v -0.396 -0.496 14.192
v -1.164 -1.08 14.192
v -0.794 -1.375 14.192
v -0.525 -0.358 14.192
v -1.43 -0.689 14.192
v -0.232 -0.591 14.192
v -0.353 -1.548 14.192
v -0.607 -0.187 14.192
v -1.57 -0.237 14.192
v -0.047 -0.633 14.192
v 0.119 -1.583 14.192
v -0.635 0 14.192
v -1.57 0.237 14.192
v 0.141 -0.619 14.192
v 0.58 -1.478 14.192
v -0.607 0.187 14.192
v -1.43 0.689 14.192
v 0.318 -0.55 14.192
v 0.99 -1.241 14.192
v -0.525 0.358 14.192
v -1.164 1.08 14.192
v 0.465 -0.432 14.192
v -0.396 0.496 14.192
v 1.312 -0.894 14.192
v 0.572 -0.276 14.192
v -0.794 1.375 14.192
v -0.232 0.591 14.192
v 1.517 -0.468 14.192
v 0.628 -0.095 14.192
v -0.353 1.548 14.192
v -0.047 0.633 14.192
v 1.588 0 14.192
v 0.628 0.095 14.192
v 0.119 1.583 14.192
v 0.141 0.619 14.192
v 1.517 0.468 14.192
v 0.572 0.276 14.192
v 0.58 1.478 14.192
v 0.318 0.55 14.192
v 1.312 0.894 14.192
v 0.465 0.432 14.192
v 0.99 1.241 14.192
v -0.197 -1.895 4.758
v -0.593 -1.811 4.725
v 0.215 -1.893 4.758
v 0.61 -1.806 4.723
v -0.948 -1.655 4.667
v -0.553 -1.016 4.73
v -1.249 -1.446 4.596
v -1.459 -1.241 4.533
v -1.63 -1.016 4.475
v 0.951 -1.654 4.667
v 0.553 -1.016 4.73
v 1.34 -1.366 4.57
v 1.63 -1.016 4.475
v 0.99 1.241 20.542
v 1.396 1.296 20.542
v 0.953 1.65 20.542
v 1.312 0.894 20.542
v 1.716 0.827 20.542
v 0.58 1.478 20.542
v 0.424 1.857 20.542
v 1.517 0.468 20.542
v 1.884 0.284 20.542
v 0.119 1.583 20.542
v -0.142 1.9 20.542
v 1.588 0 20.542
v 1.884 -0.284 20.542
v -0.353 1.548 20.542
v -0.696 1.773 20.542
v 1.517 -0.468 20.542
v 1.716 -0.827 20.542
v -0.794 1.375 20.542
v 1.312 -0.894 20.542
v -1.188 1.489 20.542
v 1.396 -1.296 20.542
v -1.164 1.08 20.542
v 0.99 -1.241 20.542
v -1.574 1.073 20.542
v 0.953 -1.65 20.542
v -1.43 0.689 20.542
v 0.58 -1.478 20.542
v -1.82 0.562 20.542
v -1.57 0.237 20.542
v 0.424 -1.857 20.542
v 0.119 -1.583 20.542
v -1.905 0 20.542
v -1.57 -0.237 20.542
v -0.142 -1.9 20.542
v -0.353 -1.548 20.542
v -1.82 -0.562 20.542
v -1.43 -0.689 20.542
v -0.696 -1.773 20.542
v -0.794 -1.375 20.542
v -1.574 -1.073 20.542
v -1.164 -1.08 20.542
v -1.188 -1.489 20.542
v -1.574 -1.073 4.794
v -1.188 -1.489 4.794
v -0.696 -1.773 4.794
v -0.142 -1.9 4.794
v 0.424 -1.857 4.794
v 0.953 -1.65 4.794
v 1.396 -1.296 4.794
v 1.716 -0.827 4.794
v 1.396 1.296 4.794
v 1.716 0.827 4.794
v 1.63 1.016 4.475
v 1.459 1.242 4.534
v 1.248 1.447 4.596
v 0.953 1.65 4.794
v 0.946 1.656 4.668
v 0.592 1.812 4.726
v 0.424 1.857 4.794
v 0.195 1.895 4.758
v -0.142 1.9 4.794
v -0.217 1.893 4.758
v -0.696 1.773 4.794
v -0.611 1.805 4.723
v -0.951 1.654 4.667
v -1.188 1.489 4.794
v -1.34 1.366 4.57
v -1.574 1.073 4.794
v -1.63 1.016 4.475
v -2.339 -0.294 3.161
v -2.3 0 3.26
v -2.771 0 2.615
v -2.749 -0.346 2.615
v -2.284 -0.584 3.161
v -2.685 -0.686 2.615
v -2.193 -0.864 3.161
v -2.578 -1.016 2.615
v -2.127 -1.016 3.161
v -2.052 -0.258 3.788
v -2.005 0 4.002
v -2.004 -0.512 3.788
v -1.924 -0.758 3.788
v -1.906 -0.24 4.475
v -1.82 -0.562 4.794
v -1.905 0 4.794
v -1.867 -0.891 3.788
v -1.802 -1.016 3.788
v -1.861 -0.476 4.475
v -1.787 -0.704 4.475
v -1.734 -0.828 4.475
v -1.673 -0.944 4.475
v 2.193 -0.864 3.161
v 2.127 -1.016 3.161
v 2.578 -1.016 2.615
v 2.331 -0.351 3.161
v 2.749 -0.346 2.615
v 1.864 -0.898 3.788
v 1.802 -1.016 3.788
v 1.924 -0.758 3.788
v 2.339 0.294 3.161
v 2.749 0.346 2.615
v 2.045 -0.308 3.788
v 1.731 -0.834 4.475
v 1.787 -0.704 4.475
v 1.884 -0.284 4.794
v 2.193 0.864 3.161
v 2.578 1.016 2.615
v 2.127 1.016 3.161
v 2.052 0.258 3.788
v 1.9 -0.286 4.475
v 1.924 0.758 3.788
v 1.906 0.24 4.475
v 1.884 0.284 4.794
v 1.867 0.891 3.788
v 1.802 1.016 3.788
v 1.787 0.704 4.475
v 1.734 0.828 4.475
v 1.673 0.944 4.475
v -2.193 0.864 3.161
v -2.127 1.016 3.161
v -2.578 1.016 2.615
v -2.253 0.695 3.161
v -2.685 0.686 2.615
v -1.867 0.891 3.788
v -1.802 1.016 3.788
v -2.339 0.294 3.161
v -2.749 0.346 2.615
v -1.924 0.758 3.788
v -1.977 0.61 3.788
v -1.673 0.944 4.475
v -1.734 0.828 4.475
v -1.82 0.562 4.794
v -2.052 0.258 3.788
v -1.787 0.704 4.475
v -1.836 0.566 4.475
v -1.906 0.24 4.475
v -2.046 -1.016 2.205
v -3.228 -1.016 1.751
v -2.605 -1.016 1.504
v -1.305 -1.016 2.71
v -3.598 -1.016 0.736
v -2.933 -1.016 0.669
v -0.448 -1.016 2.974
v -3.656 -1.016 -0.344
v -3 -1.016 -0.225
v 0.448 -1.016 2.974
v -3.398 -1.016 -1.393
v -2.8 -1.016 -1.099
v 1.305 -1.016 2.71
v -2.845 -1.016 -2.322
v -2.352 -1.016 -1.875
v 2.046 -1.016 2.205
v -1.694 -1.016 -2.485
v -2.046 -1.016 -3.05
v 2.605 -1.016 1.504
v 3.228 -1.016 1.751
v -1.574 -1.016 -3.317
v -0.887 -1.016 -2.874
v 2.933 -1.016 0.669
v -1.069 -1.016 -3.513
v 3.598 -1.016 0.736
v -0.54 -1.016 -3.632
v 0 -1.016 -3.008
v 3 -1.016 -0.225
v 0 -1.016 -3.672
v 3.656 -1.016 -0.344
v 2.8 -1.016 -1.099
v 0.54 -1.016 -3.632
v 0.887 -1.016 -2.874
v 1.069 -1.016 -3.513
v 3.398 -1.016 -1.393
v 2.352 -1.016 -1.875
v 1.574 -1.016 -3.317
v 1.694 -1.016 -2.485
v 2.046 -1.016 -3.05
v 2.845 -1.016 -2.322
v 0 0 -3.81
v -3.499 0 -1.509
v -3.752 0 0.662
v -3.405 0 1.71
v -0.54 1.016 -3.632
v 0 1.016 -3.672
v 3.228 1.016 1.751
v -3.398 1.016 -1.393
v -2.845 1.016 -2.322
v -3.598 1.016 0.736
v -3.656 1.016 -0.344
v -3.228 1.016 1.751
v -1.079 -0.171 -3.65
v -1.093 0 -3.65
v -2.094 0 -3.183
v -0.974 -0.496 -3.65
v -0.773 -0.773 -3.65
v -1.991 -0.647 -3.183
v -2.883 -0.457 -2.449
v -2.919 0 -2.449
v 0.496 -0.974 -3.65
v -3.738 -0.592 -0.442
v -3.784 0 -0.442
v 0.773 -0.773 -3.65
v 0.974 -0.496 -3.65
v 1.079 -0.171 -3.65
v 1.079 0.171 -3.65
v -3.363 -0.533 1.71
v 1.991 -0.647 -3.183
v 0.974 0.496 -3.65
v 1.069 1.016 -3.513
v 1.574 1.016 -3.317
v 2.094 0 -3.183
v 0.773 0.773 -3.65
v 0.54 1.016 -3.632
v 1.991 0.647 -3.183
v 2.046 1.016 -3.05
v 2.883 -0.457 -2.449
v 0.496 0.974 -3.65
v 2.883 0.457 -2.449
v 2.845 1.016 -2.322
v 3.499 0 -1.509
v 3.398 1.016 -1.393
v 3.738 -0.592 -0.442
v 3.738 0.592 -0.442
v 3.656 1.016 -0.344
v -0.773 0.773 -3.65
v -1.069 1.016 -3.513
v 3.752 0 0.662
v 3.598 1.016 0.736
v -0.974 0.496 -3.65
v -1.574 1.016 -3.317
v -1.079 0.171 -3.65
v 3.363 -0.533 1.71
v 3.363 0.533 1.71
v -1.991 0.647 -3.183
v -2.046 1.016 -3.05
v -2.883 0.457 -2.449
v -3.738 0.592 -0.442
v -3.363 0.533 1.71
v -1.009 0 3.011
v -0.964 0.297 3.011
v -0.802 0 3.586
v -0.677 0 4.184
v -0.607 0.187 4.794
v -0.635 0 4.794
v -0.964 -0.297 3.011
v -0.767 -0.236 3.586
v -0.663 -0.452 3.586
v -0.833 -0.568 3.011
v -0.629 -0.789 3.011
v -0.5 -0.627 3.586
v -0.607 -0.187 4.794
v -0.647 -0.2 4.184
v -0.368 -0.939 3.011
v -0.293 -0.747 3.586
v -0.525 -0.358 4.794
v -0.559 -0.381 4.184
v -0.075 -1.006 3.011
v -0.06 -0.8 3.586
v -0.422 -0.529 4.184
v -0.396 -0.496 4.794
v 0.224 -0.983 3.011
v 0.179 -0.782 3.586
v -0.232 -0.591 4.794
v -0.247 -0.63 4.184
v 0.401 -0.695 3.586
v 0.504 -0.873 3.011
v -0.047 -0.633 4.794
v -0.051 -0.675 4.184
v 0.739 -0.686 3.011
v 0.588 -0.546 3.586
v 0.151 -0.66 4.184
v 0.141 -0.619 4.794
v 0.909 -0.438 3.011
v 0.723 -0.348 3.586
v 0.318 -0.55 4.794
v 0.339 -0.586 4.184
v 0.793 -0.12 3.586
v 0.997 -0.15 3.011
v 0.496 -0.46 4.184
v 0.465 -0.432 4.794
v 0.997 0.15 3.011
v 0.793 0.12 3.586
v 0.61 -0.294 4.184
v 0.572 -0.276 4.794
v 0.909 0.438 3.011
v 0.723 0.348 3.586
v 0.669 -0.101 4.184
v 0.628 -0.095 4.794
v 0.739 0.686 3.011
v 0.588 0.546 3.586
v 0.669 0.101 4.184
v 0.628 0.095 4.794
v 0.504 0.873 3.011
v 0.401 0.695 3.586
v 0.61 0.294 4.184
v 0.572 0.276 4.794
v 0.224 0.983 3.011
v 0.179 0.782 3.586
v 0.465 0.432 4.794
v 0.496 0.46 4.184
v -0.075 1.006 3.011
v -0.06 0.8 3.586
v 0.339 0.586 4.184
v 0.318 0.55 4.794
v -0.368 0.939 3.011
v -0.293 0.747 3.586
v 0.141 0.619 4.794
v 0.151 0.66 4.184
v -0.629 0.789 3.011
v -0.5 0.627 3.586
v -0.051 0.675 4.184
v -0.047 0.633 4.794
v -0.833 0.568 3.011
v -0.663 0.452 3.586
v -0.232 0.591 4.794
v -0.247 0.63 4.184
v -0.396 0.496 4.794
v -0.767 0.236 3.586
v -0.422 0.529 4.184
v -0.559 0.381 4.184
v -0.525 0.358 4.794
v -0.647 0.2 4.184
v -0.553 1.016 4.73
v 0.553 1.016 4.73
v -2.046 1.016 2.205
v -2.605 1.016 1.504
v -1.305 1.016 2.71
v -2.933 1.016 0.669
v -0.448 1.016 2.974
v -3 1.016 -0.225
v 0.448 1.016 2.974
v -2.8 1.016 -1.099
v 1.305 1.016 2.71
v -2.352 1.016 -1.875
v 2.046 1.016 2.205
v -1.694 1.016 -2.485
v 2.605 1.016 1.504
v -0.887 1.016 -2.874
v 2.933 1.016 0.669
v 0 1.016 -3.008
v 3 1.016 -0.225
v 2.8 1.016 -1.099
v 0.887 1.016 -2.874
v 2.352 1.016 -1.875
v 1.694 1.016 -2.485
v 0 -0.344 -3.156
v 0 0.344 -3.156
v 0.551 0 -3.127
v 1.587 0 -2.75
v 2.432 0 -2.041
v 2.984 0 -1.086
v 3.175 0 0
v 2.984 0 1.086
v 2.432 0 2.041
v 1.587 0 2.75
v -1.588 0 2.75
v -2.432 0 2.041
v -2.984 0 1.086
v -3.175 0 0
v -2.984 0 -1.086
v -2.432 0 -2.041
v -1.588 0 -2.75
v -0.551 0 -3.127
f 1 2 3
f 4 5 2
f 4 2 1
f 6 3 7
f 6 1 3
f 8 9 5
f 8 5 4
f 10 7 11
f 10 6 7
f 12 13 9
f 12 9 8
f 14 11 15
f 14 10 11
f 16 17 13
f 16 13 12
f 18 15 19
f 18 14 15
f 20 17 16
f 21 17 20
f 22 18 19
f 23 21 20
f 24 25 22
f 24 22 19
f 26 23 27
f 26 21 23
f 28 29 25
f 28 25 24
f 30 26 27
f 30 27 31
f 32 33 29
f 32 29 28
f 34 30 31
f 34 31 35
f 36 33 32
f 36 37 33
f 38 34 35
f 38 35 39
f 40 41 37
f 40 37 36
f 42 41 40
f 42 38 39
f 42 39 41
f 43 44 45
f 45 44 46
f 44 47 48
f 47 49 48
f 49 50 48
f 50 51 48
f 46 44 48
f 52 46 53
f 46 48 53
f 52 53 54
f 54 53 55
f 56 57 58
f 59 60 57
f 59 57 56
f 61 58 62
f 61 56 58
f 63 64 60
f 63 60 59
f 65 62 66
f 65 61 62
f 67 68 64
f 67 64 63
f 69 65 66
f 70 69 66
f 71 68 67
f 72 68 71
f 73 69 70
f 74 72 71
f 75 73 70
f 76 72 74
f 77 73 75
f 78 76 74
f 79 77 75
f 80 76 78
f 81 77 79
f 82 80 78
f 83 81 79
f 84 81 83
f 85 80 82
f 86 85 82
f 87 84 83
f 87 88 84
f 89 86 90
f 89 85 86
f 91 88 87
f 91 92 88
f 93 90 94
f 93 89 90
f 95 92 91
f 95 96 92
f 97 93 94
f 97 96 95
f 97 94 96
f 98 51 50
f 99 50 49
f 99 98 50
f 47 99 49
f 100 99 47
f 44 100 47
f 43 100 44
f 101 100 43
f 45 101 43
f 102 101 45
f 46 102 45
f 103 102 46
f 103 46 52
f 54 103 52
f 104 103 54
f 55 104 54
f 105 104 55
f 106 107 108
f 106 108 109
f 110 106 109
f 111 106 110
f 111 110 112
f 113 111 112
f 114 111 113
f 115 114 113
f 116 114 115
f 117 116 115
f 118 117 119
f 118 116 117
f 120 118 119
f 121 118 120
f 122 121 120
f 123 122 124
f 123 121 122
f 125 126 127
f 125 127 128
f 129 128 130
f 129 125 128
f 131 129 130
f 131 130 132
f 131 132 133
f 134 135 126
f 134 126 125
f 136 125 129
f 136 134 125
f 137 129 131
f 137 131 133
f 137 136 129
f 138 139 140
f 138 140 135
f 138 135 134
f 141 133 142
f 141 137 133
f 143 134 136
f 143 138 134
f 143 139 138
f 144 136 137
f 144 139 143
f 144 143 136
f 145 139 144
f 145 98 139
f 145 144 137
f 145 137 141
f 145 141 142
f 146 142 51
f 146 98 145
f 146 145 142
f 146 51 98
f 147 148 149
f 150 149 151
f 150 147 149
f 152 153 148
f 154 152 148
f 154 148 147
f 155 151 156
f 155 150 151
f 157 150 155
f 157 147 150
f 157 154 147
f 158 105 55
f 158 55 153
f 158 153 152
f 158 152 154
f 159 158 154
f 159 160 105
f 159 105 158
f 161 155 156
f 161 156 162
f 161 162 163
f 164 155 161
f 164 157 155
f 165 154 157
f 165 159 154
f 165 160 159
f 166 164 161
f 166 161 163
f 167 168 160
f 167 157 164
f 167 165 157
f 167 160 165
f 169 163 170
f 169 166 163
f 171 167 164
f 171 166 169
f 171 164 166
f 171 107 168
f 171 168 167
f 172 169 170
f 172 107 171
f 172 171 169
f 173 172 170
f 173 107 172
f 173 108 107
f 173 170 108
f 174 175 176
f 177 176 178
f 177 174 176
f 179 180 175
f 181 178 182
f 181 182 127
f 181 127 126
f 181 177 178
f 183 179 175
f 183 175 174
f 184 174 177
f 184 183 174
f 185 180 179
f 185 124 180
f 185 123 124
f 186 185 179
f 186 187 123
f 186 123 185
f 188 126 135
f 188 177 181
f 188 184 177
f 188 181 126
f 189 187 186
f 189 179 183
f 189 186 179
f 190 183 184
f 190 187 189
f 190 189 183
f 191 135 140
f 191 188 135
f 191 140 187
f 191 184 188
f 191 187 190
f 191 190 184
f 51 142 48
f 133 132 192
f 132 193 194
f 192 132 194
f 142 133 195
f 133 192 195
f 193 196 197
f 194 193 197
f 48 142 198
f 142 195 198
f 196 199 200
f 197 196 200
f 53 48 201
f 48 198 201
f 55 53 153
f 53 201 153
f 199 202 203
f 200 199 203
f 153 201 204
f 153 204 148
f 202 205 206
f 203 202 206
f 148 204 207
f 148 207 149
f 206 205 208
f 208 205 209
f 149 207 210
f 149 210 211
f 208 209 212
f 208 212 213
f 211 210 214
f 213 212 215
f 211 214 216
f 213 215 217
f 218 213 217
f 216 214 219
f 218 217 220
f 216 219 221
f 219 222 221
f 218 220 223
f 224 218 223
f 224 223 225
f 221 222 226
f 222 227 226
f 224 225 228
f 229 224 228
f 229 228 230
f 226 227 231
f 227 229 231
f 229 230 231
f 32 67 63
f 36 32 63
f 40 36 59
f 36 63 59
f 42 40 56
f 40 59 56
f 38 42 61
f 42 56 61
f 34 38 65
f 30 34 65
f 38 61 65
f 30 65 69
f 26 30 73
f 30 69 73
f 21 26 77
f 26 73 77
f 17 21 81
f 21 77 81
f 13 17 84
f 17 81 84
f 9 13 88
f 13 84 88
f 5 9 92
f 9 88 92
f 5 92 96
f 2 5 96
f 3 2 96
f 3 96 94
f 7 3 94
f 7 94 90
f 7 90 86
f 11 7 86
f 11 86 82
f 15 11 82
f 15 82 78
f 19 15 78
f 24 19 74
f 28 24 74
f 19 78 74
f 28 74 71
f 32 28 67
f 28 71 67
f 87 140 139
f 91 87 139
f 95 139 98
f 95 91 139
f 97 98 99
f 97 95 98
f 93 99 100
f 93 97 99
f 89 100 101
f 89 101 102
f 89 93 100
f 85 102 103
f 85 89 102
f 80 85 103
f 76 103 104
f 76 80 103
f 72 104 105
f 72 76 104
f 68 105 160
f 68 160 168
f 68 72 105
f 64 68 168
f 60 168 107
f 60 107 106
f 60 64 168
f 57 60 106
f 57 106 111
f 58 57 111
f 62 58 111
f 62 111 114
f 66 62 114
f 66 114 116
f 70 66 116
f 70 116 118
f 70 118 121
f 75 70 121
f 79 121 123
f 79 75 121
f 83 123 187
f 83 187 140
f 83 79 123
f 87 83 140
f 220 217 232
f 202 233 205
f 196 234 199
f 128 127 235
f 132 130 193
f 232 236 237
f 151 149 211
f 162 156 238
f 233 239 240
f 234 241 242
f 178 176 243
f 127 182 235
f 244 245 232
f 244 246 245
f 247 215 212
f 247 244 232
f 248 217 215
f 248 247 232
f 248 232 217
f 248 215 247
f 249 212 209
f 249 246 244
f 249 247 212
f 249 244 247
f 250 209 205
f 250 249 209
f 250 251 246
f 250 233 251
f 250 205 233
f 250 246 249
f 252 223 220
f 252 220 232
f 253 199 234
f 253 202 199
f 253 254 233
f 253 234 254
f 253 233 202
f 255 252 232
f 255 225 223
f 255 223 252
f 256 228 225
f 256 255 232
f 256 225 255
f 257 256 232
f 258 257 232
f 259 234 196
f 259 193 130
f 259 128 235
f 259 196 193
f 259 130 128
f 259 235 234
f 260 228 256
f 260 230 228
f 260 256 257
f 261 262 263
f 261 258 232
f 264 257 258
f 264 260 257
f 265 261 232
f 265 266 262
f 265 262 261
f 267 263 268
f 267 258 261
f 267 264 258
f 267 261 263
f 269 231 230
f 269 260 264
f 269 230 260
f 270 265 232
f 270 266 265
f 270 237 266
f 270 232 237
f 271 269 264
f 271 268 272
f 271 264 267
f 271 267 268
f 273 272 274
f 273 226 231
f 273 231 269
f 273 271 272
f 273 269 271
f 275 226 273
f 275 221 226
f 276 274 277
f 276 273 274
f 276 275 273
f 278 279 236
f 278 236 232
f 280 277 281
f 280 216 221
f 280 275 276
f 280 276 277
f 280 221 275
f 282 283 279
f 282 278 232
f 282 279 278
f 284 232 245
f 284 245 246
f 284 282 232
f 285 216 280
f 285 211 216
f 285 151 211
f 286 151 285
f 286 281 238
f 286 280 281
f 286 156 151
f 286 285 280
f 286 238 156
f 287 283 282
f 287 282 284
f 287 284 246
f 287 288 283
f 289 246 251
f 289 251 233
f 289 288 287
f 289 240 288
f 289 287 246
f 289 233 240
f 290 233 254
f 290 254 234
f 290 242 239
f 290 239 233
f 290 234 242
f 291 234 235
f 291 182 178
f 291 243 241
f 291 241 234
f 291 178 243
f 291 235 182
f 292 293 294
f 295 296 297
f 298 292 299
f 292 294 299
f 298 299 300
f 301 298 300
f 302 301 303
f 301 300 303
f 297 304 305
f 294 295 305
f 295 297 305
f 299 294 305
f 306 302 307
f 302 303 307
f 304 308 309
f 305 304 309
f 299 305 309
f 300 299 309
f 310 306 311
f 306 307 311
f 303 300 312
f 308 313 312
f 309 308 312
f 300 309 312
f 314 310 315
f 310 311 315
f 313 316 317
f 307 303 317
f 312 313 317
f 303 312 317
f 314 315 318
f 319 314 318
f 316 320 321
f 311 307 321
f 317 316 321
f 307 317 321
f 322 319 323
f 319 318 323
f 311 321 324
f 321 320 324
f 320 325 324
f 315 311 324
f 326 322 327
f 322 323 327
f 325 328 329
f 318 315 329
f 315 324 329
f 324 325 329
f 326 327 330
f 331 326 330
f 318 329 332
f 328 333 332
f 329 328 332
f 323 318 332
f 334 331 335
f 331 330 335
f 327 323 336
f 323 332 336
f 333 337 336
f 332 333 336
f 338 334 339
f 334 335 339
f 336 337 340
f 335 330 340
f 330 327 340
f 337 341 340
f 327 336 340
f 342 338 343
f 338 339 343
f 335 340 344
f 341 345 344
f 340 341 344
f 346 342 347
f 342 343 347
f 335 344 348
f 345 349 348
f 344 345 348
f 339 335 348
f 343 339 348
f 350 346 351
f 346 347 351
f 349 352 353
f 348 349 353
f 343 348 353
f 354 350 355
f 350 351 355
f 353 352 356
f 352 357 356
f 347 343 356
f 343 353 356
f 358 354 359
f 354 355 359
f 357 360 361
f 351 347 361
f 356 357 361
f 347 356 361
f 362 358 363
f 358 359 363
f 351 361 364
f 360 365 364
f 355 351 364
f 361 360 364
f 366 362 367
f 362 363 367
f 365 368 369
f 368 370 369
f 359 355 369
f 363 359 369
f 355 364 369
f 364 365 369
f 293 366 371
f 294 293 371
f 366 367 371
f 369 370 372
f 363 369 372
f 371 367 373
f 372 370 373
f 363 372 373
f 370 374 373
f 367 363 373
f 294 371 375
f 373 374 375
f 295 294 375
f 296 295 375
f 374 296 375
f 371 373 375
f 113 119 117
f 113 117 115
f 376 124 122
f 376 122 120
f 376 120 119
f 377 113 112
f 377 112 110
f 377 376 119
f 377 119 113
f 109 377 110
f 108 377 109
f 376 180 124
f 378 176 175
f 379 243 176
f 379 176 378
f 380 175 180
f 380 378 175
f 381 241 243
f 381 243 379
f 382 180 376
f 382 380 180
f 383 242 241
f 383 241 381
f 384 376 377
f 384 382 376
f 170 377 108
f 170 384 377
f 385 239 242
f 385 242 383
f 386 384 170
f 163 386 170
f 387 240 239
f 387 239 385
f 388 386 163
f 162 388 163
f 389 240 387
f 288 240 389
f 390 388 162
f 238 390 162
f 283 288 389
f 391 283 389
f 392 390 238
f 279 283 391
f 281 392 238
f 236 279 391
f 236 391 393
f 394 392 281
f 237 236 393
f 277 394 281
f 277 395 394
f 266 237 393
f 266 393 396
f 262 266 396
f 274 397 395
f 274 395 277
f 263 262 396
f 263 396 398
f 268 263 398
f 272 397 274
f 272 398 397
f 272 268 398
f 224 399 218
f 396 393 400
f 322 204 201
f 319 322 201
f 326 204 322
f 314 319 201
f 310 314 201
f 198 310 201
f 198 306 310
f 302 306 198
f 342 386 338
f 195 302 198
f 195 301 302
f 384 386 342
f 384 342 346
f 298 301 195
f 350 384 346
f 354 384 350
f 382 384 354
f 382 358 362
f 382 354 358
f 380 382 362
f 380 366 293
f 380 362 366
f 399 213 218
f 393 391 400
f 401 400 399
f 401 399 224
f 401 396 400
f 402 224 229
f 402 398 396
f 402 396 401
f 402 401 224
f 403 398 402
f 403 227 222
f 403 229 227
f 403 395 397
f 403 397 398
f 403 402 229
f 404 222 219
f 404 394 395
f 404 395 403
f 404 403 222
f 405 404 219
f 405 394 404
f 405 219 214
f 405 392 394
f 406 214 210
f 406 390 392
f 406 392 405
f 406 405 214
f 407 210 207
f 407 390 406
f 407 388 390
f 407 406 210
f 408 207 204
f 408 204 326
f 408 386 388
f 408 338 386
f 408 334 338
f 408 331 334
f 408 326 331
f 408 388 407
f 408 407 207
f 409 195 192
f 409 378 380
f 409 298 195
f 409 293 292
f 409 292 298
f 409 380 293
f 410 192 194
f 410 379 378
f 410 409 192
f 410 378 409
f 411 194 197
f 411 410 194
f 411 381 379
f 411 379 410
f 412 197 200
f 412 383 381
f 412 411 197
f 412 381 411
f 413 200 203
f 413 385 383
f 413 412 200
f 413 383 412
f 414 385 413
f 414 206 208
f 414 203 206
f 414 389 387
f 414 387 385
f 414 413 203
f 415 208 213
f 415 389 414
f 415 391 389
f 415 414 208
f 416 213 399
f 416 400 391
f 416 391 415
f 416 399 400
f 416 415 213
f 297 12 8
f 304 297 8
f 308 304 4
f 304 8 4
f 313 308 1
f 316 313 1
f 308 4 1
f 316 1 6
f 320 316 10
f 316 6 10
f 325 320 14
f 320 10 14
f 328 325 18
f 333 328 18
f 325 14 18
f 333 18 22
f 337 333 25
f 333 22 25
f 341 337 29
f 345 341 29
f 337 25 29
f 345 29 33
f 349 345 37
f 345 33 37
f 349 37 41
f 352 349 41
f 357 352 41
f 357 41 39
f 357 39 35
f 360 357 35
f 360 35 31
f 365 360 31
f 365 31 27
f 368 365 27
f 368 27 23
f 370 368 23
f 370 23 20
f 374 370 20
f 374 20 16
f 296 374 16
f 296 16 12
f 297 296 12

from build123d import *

# Parameters (mm, degrees)
SHELL1_T           = -1.27
SKETCH2_R          = 1.5875
CUT_EXTRUDE2_DEPTH = 6.35
SKETCH3_R          = 4.7625
CUT_EXTRUDE3_DEPTH = 3.81


with BuildPart() as part:
    # Sketch1 → Revolve1 (revolve)
    with BuildSketch(Plane(origin=(0, 0, 0), x_dir=(1, 0, 0), z_dir=(0, 1, 0))):
        with BuildLine():
            Line((-1.905, -4.794144866), (-1.905, -20.542144866))
            Line((-1.905, -20.542144866), (0, -20.542144866))
            Line((0, -20.542144866), (0, 3.81))
            ThreePointArc((0, 3.81), (-3.498514306, 1.508806698), (-2.770909091, -2.614988109))
            ThreePointArc((-2.770909091, -2.614988109), (-2.129407802, -3.621698415), (-1.905, -4.794144866))
        make_face()
    revolve(axis=Axis((0, 0, -3.81), (0, 0, 1)))

    # Shell1
    shell1_openings = [part.faces().sort_by_distance(p)[0] for p in [
        (0, 0, 20.542144866),
    ]]
    offset(amount=SHELL1_T, openings=shell1_openings, kind=Kind.INTERSECTION)

    # Sketch4 → Cut-Revolve1 (revolve, cut)
    with BuildSketch(Plane(origin=(0, 0, 0), x_dir=(0, 0, -1), z_dir=(1, 0, 0))):
        with BuildLine():
            Line((0, 3.175), (0, -3.175))
            ThreePointArc((0, -3.175), (3.175, 0), (0, 3.175))
        make_face()
    revolve(axis=Axis((0, 3.175, 0), (0, -1, 0)), mode=Mode.SUBTRACT)

    # Sketch2 → Cut-Extrude2 (cut)
    with BuildSketch(Plane.XY.offset(20.542144866)):
        Circle(SKETCH2_R)
    extrude(amount=-CUT_EXTRUDE2_DEPTH, mode=Mode.SUBTRACT)

    # Sketch3 → Cut-Extrude3 (cut)
    with BuildSketch(Plane(origin=(0, 1.016, 0), x_dir=(1, 0, 0), z_dir=(0, 1, 0))):
        Circle(SKETCH3_R)
    cut_extrude3 = extrude(amount=CUT_EXTRUDE3_DEPTH, mode=Mode.SUBTRACT)

    # Mirror1: Cut-Extrude3 across plane
    add(cut_extrude3.mirror(Plane.ZX), mode=Mode.SUBTRACT)


solid = part.part
